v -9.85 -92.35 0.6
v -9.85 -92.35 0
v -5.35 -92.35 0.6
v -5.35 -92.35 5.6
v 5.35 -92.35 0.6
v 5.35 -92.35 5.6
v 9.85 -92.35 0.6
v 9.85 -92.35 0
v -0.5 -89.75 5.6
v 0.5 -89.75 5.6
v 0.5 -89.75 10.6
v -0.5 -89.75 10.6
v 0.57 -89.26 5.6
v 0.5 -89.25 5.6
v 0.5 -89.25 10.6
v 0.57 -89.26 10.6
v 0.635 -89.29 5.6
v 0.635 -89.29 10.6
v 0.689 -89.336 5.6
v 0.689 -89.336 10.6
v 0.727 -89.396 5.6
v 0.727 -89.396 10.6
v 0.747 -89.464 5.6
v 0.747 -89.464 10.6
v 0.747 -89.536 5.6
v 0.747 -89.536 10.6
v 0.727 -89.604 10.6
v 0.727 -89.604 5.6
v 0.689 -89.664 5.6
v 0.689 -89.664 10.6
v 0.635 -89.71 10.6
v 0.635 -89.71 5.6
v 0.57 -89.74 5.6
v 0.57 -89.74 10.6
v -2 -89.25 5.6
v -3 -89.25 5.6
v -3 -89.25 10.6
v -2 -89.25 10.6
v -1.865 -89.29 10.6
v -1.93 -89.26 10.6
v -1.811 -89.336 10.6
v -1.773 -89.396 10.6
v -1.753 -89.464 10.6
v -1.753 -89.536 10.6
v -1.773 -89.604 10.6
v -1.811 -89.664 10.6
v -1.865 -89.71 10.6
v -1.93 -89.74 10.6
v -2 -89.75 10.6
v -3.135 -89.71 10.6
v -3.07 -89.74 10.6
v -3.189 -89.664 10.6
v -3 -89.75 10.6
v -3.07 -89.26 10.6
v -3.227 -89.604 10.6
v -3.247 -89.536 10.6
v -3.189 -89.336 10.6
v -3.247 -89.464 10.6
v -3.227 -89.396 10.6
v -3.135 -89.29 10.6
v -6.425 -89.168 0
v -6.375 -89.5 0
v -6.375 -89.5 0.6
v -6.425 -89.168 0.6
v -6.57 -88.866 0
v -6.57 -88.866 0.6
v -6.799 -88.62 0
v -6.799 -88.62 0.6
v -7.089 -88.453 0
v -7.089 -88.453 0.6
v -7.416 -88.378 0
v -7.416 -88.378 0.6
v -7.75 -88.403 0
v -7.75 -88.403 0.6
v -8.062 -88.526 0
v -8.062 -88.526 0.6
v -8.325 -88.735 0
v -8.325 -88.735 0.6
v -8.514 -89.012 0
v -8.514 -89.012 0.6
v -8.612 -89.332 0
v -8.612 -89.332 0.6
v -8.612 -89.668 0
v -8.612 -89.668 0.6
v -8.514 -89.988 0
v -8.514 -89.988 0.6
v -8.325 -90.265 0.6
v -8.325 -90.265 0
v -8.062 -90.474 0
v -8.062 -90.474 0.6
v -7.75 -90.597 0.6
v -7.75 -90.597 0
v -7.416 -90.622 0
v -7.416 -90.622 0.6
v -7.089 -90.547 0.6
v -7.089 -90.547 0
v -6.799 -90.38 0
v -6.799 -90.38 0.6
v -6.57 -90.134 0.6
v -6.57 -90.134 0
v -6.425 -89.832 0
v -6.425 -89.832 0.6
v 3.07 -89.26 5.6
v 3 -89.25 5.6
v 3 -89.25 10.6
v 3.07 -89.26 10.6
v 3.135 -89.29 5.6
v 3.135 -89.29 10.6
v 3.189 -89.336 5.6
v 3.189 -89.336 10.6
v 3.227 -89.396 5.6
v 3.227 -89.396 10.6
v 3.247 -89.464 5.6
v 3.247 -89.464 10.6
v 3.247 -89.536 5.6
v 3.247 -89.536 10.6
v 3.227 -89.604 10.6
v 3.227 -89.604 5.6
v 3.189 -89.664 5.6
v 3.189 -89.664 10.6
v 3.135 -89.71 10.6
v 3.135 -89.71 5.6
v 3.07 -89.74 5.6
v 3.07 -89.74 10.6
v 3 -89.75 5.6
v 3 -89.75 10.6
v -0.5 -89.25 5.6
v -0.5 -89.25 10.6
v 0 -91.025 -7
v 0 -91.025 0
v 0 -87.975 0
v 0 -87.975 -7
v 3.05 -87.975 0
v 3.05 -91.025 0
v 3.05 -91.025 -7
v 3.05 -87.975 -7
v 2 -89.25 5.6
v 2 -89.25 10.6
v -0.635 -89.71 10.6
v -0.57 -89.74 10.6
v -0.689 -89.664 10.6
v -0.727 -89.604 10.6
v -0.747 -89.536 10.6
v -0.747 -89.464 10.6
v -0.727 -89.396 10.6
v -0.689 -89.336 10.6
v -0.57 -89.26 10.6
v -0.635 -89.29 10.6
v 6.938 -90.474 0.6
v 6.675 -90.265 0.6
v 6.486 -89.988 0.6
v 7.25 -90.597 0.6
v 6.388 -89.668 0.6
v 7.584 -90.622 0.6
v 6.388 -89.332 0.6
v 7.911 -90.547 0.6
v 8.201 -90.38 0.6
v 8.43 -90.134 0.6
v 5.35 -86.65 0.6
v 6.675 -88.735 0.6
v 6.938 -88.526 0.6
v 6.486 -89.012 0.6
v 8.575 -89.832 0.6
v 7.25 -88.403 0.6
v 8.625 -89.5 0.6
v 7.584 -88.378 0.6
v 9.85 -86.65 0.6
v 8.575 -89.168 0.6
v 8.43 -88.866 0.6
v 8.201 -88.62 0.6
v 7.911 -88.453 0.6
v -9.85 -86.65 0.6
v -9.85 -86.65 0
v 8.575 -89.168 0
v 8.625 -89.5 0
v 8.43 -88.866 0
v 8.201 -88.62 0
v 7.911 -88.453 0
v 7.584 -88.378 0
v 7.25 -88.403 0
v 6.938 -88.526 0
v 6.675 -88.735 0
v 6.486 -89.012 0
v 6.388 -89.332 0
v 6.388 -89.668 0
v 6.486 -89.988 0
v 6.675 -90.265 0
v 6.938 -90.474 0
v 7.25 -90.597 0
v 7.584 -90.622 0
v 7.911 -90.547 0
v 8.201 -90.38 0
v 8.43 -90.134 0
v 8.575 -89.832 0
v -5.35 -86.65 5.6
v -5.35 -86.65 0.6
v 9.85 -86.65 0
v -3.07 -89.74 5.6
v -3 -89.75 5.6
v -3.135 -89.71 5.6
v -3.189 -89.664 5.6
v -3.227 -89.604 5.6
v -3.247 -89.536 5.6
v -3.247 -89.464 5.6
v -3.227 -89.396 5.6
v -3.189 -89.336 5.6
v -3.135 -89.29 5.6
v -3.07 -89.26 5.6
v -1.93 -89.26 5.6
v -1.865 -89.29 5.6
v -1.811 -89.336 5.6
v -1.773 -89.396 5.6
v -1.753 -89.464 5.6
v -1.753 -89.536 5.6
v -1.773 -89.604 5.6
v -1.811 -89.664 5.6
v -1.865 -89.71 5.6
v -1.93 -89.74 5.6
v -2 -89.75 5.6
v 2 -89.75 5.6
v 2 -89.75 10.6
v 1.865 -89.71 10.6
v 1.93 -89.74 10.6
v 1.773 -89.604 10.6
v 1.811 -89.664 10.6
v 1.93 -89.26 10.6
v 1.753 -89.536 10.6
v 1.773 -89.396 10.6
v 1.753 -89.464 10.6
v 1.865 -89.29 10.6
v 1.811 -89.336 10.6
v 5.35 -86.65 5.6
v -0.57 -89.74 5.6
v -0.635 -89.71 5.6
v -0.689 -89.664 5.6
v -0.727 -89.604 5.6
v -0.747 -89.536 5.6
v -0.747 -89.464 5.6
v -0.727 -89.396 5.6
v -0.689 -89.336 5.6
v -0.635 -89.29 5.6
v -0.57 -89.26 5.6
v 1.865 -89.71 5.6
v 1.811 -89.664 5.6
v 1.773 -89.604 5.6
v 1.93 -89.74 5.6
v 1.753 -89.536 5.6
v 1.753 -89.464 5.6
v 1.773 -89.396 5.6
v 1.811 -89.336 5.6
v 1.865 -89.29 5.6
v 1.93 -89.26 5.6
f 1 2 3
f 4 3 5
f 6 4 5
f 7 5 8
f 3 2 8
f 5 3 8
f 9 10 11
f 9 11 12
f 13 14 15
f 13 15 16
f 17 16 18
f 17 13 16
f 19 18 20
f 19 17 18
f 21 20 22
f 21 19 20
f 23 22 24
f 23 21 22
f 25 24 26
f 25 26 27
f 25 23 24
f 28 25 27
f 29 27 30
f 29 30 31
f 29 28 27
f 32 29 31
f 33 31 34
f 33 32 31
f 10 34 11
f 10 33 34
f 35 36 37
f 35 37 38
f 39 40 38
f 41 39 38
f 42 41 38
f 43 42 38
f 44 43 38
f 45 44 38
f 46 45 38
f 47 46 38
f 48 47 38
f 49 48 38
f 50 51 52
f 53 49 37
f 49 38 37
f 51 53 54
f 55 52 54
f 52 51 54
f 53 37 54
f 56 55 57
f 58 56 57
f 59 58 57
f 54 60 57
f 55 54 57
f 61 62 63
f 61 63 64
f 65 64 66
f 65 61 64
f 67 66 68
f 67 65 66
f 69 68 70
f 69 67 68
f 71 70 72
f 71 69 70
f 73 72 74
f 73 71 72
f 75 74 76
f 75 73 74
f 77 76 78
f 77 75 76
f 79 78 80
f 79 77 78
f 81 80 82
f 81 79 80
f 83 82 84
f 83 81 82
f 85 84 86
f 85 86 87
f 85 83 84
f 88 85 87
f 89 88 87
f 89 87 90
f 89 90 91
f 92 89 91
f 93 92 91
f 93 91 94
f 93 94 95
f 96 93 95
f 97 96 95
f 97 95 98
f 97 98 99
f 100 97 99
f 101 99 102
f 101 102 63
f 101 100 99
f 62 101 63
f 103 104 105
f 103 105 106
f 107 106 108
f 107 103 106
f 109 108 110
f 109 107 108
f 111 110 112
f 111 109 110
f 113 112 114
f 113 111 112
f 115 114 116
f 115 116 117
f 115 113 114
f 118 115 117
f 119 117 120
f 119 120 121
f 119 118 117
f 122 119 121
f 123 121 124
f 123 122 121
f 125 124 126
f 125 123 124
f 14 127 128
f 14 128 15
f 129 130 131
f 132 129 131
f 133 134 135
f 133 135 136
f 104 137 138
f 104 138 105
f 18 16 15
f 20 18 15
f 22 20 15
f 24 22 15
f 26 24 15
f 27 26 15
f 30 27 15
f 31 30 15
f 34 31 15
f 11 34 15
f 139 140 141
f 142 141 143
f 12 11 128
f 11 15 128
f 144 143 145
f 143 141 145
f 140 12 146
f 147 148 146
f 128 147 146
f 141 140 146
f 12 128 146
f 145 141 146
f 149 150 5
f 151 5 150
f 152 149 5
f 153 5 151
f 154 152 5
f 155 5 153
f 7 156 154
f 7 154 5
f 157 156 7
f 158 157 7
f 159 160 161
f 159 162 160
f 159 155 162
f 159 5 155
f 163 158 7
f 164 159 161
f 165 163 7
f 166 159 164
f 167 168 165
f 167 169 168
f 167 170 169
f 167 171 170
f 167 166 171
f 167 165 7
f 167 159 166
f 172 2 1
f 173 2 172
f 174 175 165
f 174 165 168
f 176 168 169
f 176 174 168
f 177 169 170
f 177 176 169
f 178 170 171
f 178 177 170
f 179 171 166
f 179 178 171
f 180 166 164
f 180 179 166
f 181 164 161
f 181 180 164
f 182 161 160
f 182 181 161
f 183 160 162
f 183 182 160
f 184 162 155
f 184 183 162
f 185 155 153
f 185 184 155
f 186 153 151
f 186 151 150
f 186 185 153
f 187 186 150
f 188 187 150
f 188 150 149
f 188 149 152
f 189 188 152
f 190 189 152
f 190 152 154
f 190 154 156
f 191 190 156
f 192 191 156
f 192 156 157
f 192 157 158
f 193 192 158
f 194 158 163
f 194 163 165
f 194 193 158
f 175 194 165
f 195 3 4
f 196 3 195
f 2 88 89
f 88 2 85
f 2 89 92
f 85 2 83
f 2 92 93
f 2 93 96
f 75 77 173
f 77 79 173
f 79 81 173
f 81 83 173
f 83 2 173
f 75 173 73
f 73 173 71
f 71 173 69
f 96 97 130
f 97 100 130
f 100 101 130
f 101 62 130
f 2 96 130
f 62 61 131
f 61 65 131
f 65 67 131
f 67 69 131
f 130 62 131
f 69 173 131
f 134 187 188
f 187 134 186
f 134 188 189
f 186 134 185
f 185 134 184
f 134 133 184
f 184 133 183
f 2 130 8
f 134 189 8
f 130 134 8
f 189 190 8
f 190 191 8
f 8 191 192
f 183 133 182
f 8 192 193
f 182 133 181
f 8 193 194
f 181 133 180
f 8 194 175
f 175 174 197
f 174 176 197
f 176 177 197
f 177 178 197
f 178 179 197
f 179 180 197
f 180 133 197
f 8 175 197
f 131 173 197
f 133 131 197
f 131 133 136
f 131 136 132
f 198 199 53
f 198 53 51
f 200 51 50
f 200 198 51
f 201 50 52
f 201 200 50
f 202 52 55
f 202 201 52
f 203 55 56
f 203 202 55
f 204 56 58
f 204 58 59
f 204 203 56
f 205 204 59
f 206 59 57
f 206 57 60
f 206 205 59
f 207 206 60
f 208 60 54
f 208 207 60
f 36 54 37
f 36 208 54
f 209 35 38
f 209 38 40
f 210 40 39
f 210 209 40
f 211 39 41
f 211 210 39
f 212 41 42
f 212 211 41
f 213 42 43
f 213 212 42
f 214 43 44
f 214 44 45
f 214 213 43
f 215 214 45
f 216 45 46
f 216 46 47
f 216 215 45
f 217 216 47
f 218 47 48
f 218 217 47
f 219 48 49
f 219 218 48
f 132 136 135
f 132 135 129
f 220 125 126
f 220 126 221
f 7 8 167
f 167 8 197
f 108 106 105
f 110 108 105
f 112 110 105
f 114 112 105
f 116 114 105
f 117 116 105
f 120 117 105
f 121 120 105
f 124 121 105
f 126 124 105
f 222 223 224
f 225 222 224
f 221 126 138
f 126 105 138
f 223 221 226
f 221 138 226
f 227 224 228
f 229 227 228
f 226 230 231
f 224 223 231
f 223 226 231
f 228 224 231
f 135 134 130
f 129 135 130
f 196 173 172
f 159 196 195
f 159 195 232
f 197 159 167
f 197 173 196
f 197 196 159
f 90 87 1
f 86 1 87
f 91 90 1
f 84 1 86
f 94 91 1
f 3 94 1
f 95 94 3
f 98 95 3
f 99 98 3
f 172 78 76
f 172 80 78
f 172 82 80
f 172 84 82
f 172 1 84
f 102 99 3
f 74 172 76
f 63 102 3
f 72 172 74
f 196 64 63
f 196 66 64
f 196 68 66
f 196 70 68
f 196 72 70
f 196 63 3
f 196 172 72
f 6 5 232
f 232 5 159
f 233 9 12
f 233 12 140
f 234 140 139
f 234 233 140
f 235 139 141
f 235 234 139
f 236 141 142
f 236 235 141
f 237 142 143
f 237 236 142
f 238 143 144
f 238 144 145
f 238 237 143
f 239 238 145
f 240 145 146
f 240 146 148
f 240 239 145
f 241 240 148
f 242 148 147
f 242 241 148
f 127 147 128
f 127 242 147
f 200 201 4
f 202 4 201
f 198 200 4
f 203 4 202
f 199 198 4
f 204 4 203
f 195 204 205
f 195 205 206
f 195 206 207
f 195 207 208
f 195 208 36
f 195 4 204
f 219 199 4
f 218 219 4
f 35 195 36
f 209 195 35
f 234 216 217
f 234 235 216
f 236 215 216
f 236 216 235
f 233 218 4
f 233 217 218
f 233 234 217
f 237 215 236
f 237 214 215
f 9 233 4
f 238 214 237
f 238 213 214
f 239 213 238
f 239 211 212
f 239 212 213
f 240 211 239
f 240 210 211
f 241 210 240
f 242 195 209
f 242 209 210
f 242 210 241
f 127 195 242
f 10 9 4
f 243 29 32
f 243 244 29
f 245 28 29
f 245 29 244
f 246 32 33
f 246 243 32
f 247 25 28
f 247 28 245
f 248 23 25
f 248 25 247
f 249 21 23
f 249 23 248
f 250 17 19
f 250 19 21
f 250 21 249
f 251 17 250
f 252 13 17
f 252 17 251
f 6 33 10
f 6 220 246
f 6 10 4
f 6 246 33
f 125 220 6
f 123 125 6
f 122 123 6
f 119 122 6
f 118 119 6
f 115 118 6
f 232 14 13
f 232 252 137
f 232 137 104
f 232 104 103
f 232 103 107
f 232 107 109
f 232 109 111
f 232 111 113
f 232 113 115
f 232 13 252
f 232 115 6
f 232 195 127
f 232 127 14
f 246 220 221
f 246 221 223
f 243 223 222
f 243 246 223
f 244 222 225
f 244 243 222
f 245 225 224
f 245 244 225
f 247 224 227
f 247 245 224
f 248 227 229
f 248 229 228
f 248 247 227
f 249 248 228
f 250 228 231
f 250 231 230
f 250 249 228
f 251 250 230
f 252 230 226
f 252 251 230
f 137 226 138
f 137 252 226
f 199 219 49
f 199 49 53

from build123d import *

# Parameters (mm, degrees)
SKETCH1_W           = 19.7
SKETCH1_H           = 5.7
SKETCH1_R           = 1.125
BOSS_EXTRUDE1_DEPTH = 0.6
SKETCH2_W           = 10.7
SKETCH2_H           = 5.7
BOSS_EXTRUDE2_DEPTH = 5
SKETCH3_W           = 3.05
SKETCH3_H           = 3.05
BOSS_EXTRUDE3_DEPTH = 7
BOSS_EXTRUDE4_DEPTH = 5


with BuildPart() as part:
    # Sketch1 → Boss-Extrude1 (new body)
    with BuildSketch(Plane.XY):
        with Locations((0, -89.5)):
            Rectangle(SKETCH1_W, SKETCH1_H)
        with Locations((7.5, -89.5)):
            Circle(SKETCH1_R, mode=Mode.SUBTRACT)
        with Locations((-7.5, -89.5)):
            Circle(SKETCH1_R, mode=Mode.SUBTRACT)
    extrude(amount=BOSS_EXTRUDE1_DEPTH)

    # Sketch2 → Boss-Extrude2 (add)
    with BuildSketch(Plane.XY.offset(0.6)):
        with Locations((0, -89.5)):
            Rectangle(SKETCH2_W, SKETCH2_H)
    extrude(amount=BOSS_EXTRUDE2_DEPTH)

    # Sketch3 → Boss-Extrude3 (add)
    with BuildSketch(Plane(origin=(0, 0, 0), x_dir=(-1, 0, 0), z_dir=(0, 0, -1))):
        with Locations((-1.525, -89.5)):
            Rectangle(SKETCH3_W, SKETCH3_H)
    extrude(amount=BOSS_EXTRUDE3_DEPTH)

    # Sketch4 → Boss-Extrude4 (add)
    with BuildSketch(Plane.XY.offset(5.6)):
        with BuildLine():
            Line((-0.5, -89.25), (0.5, -89.25))
            ThreePointArc((0.5, -89.25), (0.75, -89.5), (0.5, -89.75))
            Line((0.5, -89.75), (-0.5, -89.75))
            ThreePointArc((-0.5, -89.75), (-0.75, -89.5), (-0.5, -89.25))
        make_face()
        with BuildLine():
            Line((2, -89.25), (3, -89.25))
            ThreePointArc((3, -89.25), (3.25, -89.5), (3, -89.75))
            Line((3, -89.75), (2, -89.75))
            ThreePointArc((2, -89.75), (1.75, -89.5), (2, -89.25))
        make_face()
        with BuildLine():
            Line((-3, -89.25), (-2, -89.25))
            ThreePointArc((-2, -89.25), (-1.75, -89.5), (-2, -89.75))
            Line((-2, -89.75), (-3, -89.75))
            ThreePointArc((-3, -89.75), (-3.25, -89.5), (-3, -89.25))
        make_face()
    extrude(amount=BOSS_EXTRUDE4_DEPTH)


solid = part.part
